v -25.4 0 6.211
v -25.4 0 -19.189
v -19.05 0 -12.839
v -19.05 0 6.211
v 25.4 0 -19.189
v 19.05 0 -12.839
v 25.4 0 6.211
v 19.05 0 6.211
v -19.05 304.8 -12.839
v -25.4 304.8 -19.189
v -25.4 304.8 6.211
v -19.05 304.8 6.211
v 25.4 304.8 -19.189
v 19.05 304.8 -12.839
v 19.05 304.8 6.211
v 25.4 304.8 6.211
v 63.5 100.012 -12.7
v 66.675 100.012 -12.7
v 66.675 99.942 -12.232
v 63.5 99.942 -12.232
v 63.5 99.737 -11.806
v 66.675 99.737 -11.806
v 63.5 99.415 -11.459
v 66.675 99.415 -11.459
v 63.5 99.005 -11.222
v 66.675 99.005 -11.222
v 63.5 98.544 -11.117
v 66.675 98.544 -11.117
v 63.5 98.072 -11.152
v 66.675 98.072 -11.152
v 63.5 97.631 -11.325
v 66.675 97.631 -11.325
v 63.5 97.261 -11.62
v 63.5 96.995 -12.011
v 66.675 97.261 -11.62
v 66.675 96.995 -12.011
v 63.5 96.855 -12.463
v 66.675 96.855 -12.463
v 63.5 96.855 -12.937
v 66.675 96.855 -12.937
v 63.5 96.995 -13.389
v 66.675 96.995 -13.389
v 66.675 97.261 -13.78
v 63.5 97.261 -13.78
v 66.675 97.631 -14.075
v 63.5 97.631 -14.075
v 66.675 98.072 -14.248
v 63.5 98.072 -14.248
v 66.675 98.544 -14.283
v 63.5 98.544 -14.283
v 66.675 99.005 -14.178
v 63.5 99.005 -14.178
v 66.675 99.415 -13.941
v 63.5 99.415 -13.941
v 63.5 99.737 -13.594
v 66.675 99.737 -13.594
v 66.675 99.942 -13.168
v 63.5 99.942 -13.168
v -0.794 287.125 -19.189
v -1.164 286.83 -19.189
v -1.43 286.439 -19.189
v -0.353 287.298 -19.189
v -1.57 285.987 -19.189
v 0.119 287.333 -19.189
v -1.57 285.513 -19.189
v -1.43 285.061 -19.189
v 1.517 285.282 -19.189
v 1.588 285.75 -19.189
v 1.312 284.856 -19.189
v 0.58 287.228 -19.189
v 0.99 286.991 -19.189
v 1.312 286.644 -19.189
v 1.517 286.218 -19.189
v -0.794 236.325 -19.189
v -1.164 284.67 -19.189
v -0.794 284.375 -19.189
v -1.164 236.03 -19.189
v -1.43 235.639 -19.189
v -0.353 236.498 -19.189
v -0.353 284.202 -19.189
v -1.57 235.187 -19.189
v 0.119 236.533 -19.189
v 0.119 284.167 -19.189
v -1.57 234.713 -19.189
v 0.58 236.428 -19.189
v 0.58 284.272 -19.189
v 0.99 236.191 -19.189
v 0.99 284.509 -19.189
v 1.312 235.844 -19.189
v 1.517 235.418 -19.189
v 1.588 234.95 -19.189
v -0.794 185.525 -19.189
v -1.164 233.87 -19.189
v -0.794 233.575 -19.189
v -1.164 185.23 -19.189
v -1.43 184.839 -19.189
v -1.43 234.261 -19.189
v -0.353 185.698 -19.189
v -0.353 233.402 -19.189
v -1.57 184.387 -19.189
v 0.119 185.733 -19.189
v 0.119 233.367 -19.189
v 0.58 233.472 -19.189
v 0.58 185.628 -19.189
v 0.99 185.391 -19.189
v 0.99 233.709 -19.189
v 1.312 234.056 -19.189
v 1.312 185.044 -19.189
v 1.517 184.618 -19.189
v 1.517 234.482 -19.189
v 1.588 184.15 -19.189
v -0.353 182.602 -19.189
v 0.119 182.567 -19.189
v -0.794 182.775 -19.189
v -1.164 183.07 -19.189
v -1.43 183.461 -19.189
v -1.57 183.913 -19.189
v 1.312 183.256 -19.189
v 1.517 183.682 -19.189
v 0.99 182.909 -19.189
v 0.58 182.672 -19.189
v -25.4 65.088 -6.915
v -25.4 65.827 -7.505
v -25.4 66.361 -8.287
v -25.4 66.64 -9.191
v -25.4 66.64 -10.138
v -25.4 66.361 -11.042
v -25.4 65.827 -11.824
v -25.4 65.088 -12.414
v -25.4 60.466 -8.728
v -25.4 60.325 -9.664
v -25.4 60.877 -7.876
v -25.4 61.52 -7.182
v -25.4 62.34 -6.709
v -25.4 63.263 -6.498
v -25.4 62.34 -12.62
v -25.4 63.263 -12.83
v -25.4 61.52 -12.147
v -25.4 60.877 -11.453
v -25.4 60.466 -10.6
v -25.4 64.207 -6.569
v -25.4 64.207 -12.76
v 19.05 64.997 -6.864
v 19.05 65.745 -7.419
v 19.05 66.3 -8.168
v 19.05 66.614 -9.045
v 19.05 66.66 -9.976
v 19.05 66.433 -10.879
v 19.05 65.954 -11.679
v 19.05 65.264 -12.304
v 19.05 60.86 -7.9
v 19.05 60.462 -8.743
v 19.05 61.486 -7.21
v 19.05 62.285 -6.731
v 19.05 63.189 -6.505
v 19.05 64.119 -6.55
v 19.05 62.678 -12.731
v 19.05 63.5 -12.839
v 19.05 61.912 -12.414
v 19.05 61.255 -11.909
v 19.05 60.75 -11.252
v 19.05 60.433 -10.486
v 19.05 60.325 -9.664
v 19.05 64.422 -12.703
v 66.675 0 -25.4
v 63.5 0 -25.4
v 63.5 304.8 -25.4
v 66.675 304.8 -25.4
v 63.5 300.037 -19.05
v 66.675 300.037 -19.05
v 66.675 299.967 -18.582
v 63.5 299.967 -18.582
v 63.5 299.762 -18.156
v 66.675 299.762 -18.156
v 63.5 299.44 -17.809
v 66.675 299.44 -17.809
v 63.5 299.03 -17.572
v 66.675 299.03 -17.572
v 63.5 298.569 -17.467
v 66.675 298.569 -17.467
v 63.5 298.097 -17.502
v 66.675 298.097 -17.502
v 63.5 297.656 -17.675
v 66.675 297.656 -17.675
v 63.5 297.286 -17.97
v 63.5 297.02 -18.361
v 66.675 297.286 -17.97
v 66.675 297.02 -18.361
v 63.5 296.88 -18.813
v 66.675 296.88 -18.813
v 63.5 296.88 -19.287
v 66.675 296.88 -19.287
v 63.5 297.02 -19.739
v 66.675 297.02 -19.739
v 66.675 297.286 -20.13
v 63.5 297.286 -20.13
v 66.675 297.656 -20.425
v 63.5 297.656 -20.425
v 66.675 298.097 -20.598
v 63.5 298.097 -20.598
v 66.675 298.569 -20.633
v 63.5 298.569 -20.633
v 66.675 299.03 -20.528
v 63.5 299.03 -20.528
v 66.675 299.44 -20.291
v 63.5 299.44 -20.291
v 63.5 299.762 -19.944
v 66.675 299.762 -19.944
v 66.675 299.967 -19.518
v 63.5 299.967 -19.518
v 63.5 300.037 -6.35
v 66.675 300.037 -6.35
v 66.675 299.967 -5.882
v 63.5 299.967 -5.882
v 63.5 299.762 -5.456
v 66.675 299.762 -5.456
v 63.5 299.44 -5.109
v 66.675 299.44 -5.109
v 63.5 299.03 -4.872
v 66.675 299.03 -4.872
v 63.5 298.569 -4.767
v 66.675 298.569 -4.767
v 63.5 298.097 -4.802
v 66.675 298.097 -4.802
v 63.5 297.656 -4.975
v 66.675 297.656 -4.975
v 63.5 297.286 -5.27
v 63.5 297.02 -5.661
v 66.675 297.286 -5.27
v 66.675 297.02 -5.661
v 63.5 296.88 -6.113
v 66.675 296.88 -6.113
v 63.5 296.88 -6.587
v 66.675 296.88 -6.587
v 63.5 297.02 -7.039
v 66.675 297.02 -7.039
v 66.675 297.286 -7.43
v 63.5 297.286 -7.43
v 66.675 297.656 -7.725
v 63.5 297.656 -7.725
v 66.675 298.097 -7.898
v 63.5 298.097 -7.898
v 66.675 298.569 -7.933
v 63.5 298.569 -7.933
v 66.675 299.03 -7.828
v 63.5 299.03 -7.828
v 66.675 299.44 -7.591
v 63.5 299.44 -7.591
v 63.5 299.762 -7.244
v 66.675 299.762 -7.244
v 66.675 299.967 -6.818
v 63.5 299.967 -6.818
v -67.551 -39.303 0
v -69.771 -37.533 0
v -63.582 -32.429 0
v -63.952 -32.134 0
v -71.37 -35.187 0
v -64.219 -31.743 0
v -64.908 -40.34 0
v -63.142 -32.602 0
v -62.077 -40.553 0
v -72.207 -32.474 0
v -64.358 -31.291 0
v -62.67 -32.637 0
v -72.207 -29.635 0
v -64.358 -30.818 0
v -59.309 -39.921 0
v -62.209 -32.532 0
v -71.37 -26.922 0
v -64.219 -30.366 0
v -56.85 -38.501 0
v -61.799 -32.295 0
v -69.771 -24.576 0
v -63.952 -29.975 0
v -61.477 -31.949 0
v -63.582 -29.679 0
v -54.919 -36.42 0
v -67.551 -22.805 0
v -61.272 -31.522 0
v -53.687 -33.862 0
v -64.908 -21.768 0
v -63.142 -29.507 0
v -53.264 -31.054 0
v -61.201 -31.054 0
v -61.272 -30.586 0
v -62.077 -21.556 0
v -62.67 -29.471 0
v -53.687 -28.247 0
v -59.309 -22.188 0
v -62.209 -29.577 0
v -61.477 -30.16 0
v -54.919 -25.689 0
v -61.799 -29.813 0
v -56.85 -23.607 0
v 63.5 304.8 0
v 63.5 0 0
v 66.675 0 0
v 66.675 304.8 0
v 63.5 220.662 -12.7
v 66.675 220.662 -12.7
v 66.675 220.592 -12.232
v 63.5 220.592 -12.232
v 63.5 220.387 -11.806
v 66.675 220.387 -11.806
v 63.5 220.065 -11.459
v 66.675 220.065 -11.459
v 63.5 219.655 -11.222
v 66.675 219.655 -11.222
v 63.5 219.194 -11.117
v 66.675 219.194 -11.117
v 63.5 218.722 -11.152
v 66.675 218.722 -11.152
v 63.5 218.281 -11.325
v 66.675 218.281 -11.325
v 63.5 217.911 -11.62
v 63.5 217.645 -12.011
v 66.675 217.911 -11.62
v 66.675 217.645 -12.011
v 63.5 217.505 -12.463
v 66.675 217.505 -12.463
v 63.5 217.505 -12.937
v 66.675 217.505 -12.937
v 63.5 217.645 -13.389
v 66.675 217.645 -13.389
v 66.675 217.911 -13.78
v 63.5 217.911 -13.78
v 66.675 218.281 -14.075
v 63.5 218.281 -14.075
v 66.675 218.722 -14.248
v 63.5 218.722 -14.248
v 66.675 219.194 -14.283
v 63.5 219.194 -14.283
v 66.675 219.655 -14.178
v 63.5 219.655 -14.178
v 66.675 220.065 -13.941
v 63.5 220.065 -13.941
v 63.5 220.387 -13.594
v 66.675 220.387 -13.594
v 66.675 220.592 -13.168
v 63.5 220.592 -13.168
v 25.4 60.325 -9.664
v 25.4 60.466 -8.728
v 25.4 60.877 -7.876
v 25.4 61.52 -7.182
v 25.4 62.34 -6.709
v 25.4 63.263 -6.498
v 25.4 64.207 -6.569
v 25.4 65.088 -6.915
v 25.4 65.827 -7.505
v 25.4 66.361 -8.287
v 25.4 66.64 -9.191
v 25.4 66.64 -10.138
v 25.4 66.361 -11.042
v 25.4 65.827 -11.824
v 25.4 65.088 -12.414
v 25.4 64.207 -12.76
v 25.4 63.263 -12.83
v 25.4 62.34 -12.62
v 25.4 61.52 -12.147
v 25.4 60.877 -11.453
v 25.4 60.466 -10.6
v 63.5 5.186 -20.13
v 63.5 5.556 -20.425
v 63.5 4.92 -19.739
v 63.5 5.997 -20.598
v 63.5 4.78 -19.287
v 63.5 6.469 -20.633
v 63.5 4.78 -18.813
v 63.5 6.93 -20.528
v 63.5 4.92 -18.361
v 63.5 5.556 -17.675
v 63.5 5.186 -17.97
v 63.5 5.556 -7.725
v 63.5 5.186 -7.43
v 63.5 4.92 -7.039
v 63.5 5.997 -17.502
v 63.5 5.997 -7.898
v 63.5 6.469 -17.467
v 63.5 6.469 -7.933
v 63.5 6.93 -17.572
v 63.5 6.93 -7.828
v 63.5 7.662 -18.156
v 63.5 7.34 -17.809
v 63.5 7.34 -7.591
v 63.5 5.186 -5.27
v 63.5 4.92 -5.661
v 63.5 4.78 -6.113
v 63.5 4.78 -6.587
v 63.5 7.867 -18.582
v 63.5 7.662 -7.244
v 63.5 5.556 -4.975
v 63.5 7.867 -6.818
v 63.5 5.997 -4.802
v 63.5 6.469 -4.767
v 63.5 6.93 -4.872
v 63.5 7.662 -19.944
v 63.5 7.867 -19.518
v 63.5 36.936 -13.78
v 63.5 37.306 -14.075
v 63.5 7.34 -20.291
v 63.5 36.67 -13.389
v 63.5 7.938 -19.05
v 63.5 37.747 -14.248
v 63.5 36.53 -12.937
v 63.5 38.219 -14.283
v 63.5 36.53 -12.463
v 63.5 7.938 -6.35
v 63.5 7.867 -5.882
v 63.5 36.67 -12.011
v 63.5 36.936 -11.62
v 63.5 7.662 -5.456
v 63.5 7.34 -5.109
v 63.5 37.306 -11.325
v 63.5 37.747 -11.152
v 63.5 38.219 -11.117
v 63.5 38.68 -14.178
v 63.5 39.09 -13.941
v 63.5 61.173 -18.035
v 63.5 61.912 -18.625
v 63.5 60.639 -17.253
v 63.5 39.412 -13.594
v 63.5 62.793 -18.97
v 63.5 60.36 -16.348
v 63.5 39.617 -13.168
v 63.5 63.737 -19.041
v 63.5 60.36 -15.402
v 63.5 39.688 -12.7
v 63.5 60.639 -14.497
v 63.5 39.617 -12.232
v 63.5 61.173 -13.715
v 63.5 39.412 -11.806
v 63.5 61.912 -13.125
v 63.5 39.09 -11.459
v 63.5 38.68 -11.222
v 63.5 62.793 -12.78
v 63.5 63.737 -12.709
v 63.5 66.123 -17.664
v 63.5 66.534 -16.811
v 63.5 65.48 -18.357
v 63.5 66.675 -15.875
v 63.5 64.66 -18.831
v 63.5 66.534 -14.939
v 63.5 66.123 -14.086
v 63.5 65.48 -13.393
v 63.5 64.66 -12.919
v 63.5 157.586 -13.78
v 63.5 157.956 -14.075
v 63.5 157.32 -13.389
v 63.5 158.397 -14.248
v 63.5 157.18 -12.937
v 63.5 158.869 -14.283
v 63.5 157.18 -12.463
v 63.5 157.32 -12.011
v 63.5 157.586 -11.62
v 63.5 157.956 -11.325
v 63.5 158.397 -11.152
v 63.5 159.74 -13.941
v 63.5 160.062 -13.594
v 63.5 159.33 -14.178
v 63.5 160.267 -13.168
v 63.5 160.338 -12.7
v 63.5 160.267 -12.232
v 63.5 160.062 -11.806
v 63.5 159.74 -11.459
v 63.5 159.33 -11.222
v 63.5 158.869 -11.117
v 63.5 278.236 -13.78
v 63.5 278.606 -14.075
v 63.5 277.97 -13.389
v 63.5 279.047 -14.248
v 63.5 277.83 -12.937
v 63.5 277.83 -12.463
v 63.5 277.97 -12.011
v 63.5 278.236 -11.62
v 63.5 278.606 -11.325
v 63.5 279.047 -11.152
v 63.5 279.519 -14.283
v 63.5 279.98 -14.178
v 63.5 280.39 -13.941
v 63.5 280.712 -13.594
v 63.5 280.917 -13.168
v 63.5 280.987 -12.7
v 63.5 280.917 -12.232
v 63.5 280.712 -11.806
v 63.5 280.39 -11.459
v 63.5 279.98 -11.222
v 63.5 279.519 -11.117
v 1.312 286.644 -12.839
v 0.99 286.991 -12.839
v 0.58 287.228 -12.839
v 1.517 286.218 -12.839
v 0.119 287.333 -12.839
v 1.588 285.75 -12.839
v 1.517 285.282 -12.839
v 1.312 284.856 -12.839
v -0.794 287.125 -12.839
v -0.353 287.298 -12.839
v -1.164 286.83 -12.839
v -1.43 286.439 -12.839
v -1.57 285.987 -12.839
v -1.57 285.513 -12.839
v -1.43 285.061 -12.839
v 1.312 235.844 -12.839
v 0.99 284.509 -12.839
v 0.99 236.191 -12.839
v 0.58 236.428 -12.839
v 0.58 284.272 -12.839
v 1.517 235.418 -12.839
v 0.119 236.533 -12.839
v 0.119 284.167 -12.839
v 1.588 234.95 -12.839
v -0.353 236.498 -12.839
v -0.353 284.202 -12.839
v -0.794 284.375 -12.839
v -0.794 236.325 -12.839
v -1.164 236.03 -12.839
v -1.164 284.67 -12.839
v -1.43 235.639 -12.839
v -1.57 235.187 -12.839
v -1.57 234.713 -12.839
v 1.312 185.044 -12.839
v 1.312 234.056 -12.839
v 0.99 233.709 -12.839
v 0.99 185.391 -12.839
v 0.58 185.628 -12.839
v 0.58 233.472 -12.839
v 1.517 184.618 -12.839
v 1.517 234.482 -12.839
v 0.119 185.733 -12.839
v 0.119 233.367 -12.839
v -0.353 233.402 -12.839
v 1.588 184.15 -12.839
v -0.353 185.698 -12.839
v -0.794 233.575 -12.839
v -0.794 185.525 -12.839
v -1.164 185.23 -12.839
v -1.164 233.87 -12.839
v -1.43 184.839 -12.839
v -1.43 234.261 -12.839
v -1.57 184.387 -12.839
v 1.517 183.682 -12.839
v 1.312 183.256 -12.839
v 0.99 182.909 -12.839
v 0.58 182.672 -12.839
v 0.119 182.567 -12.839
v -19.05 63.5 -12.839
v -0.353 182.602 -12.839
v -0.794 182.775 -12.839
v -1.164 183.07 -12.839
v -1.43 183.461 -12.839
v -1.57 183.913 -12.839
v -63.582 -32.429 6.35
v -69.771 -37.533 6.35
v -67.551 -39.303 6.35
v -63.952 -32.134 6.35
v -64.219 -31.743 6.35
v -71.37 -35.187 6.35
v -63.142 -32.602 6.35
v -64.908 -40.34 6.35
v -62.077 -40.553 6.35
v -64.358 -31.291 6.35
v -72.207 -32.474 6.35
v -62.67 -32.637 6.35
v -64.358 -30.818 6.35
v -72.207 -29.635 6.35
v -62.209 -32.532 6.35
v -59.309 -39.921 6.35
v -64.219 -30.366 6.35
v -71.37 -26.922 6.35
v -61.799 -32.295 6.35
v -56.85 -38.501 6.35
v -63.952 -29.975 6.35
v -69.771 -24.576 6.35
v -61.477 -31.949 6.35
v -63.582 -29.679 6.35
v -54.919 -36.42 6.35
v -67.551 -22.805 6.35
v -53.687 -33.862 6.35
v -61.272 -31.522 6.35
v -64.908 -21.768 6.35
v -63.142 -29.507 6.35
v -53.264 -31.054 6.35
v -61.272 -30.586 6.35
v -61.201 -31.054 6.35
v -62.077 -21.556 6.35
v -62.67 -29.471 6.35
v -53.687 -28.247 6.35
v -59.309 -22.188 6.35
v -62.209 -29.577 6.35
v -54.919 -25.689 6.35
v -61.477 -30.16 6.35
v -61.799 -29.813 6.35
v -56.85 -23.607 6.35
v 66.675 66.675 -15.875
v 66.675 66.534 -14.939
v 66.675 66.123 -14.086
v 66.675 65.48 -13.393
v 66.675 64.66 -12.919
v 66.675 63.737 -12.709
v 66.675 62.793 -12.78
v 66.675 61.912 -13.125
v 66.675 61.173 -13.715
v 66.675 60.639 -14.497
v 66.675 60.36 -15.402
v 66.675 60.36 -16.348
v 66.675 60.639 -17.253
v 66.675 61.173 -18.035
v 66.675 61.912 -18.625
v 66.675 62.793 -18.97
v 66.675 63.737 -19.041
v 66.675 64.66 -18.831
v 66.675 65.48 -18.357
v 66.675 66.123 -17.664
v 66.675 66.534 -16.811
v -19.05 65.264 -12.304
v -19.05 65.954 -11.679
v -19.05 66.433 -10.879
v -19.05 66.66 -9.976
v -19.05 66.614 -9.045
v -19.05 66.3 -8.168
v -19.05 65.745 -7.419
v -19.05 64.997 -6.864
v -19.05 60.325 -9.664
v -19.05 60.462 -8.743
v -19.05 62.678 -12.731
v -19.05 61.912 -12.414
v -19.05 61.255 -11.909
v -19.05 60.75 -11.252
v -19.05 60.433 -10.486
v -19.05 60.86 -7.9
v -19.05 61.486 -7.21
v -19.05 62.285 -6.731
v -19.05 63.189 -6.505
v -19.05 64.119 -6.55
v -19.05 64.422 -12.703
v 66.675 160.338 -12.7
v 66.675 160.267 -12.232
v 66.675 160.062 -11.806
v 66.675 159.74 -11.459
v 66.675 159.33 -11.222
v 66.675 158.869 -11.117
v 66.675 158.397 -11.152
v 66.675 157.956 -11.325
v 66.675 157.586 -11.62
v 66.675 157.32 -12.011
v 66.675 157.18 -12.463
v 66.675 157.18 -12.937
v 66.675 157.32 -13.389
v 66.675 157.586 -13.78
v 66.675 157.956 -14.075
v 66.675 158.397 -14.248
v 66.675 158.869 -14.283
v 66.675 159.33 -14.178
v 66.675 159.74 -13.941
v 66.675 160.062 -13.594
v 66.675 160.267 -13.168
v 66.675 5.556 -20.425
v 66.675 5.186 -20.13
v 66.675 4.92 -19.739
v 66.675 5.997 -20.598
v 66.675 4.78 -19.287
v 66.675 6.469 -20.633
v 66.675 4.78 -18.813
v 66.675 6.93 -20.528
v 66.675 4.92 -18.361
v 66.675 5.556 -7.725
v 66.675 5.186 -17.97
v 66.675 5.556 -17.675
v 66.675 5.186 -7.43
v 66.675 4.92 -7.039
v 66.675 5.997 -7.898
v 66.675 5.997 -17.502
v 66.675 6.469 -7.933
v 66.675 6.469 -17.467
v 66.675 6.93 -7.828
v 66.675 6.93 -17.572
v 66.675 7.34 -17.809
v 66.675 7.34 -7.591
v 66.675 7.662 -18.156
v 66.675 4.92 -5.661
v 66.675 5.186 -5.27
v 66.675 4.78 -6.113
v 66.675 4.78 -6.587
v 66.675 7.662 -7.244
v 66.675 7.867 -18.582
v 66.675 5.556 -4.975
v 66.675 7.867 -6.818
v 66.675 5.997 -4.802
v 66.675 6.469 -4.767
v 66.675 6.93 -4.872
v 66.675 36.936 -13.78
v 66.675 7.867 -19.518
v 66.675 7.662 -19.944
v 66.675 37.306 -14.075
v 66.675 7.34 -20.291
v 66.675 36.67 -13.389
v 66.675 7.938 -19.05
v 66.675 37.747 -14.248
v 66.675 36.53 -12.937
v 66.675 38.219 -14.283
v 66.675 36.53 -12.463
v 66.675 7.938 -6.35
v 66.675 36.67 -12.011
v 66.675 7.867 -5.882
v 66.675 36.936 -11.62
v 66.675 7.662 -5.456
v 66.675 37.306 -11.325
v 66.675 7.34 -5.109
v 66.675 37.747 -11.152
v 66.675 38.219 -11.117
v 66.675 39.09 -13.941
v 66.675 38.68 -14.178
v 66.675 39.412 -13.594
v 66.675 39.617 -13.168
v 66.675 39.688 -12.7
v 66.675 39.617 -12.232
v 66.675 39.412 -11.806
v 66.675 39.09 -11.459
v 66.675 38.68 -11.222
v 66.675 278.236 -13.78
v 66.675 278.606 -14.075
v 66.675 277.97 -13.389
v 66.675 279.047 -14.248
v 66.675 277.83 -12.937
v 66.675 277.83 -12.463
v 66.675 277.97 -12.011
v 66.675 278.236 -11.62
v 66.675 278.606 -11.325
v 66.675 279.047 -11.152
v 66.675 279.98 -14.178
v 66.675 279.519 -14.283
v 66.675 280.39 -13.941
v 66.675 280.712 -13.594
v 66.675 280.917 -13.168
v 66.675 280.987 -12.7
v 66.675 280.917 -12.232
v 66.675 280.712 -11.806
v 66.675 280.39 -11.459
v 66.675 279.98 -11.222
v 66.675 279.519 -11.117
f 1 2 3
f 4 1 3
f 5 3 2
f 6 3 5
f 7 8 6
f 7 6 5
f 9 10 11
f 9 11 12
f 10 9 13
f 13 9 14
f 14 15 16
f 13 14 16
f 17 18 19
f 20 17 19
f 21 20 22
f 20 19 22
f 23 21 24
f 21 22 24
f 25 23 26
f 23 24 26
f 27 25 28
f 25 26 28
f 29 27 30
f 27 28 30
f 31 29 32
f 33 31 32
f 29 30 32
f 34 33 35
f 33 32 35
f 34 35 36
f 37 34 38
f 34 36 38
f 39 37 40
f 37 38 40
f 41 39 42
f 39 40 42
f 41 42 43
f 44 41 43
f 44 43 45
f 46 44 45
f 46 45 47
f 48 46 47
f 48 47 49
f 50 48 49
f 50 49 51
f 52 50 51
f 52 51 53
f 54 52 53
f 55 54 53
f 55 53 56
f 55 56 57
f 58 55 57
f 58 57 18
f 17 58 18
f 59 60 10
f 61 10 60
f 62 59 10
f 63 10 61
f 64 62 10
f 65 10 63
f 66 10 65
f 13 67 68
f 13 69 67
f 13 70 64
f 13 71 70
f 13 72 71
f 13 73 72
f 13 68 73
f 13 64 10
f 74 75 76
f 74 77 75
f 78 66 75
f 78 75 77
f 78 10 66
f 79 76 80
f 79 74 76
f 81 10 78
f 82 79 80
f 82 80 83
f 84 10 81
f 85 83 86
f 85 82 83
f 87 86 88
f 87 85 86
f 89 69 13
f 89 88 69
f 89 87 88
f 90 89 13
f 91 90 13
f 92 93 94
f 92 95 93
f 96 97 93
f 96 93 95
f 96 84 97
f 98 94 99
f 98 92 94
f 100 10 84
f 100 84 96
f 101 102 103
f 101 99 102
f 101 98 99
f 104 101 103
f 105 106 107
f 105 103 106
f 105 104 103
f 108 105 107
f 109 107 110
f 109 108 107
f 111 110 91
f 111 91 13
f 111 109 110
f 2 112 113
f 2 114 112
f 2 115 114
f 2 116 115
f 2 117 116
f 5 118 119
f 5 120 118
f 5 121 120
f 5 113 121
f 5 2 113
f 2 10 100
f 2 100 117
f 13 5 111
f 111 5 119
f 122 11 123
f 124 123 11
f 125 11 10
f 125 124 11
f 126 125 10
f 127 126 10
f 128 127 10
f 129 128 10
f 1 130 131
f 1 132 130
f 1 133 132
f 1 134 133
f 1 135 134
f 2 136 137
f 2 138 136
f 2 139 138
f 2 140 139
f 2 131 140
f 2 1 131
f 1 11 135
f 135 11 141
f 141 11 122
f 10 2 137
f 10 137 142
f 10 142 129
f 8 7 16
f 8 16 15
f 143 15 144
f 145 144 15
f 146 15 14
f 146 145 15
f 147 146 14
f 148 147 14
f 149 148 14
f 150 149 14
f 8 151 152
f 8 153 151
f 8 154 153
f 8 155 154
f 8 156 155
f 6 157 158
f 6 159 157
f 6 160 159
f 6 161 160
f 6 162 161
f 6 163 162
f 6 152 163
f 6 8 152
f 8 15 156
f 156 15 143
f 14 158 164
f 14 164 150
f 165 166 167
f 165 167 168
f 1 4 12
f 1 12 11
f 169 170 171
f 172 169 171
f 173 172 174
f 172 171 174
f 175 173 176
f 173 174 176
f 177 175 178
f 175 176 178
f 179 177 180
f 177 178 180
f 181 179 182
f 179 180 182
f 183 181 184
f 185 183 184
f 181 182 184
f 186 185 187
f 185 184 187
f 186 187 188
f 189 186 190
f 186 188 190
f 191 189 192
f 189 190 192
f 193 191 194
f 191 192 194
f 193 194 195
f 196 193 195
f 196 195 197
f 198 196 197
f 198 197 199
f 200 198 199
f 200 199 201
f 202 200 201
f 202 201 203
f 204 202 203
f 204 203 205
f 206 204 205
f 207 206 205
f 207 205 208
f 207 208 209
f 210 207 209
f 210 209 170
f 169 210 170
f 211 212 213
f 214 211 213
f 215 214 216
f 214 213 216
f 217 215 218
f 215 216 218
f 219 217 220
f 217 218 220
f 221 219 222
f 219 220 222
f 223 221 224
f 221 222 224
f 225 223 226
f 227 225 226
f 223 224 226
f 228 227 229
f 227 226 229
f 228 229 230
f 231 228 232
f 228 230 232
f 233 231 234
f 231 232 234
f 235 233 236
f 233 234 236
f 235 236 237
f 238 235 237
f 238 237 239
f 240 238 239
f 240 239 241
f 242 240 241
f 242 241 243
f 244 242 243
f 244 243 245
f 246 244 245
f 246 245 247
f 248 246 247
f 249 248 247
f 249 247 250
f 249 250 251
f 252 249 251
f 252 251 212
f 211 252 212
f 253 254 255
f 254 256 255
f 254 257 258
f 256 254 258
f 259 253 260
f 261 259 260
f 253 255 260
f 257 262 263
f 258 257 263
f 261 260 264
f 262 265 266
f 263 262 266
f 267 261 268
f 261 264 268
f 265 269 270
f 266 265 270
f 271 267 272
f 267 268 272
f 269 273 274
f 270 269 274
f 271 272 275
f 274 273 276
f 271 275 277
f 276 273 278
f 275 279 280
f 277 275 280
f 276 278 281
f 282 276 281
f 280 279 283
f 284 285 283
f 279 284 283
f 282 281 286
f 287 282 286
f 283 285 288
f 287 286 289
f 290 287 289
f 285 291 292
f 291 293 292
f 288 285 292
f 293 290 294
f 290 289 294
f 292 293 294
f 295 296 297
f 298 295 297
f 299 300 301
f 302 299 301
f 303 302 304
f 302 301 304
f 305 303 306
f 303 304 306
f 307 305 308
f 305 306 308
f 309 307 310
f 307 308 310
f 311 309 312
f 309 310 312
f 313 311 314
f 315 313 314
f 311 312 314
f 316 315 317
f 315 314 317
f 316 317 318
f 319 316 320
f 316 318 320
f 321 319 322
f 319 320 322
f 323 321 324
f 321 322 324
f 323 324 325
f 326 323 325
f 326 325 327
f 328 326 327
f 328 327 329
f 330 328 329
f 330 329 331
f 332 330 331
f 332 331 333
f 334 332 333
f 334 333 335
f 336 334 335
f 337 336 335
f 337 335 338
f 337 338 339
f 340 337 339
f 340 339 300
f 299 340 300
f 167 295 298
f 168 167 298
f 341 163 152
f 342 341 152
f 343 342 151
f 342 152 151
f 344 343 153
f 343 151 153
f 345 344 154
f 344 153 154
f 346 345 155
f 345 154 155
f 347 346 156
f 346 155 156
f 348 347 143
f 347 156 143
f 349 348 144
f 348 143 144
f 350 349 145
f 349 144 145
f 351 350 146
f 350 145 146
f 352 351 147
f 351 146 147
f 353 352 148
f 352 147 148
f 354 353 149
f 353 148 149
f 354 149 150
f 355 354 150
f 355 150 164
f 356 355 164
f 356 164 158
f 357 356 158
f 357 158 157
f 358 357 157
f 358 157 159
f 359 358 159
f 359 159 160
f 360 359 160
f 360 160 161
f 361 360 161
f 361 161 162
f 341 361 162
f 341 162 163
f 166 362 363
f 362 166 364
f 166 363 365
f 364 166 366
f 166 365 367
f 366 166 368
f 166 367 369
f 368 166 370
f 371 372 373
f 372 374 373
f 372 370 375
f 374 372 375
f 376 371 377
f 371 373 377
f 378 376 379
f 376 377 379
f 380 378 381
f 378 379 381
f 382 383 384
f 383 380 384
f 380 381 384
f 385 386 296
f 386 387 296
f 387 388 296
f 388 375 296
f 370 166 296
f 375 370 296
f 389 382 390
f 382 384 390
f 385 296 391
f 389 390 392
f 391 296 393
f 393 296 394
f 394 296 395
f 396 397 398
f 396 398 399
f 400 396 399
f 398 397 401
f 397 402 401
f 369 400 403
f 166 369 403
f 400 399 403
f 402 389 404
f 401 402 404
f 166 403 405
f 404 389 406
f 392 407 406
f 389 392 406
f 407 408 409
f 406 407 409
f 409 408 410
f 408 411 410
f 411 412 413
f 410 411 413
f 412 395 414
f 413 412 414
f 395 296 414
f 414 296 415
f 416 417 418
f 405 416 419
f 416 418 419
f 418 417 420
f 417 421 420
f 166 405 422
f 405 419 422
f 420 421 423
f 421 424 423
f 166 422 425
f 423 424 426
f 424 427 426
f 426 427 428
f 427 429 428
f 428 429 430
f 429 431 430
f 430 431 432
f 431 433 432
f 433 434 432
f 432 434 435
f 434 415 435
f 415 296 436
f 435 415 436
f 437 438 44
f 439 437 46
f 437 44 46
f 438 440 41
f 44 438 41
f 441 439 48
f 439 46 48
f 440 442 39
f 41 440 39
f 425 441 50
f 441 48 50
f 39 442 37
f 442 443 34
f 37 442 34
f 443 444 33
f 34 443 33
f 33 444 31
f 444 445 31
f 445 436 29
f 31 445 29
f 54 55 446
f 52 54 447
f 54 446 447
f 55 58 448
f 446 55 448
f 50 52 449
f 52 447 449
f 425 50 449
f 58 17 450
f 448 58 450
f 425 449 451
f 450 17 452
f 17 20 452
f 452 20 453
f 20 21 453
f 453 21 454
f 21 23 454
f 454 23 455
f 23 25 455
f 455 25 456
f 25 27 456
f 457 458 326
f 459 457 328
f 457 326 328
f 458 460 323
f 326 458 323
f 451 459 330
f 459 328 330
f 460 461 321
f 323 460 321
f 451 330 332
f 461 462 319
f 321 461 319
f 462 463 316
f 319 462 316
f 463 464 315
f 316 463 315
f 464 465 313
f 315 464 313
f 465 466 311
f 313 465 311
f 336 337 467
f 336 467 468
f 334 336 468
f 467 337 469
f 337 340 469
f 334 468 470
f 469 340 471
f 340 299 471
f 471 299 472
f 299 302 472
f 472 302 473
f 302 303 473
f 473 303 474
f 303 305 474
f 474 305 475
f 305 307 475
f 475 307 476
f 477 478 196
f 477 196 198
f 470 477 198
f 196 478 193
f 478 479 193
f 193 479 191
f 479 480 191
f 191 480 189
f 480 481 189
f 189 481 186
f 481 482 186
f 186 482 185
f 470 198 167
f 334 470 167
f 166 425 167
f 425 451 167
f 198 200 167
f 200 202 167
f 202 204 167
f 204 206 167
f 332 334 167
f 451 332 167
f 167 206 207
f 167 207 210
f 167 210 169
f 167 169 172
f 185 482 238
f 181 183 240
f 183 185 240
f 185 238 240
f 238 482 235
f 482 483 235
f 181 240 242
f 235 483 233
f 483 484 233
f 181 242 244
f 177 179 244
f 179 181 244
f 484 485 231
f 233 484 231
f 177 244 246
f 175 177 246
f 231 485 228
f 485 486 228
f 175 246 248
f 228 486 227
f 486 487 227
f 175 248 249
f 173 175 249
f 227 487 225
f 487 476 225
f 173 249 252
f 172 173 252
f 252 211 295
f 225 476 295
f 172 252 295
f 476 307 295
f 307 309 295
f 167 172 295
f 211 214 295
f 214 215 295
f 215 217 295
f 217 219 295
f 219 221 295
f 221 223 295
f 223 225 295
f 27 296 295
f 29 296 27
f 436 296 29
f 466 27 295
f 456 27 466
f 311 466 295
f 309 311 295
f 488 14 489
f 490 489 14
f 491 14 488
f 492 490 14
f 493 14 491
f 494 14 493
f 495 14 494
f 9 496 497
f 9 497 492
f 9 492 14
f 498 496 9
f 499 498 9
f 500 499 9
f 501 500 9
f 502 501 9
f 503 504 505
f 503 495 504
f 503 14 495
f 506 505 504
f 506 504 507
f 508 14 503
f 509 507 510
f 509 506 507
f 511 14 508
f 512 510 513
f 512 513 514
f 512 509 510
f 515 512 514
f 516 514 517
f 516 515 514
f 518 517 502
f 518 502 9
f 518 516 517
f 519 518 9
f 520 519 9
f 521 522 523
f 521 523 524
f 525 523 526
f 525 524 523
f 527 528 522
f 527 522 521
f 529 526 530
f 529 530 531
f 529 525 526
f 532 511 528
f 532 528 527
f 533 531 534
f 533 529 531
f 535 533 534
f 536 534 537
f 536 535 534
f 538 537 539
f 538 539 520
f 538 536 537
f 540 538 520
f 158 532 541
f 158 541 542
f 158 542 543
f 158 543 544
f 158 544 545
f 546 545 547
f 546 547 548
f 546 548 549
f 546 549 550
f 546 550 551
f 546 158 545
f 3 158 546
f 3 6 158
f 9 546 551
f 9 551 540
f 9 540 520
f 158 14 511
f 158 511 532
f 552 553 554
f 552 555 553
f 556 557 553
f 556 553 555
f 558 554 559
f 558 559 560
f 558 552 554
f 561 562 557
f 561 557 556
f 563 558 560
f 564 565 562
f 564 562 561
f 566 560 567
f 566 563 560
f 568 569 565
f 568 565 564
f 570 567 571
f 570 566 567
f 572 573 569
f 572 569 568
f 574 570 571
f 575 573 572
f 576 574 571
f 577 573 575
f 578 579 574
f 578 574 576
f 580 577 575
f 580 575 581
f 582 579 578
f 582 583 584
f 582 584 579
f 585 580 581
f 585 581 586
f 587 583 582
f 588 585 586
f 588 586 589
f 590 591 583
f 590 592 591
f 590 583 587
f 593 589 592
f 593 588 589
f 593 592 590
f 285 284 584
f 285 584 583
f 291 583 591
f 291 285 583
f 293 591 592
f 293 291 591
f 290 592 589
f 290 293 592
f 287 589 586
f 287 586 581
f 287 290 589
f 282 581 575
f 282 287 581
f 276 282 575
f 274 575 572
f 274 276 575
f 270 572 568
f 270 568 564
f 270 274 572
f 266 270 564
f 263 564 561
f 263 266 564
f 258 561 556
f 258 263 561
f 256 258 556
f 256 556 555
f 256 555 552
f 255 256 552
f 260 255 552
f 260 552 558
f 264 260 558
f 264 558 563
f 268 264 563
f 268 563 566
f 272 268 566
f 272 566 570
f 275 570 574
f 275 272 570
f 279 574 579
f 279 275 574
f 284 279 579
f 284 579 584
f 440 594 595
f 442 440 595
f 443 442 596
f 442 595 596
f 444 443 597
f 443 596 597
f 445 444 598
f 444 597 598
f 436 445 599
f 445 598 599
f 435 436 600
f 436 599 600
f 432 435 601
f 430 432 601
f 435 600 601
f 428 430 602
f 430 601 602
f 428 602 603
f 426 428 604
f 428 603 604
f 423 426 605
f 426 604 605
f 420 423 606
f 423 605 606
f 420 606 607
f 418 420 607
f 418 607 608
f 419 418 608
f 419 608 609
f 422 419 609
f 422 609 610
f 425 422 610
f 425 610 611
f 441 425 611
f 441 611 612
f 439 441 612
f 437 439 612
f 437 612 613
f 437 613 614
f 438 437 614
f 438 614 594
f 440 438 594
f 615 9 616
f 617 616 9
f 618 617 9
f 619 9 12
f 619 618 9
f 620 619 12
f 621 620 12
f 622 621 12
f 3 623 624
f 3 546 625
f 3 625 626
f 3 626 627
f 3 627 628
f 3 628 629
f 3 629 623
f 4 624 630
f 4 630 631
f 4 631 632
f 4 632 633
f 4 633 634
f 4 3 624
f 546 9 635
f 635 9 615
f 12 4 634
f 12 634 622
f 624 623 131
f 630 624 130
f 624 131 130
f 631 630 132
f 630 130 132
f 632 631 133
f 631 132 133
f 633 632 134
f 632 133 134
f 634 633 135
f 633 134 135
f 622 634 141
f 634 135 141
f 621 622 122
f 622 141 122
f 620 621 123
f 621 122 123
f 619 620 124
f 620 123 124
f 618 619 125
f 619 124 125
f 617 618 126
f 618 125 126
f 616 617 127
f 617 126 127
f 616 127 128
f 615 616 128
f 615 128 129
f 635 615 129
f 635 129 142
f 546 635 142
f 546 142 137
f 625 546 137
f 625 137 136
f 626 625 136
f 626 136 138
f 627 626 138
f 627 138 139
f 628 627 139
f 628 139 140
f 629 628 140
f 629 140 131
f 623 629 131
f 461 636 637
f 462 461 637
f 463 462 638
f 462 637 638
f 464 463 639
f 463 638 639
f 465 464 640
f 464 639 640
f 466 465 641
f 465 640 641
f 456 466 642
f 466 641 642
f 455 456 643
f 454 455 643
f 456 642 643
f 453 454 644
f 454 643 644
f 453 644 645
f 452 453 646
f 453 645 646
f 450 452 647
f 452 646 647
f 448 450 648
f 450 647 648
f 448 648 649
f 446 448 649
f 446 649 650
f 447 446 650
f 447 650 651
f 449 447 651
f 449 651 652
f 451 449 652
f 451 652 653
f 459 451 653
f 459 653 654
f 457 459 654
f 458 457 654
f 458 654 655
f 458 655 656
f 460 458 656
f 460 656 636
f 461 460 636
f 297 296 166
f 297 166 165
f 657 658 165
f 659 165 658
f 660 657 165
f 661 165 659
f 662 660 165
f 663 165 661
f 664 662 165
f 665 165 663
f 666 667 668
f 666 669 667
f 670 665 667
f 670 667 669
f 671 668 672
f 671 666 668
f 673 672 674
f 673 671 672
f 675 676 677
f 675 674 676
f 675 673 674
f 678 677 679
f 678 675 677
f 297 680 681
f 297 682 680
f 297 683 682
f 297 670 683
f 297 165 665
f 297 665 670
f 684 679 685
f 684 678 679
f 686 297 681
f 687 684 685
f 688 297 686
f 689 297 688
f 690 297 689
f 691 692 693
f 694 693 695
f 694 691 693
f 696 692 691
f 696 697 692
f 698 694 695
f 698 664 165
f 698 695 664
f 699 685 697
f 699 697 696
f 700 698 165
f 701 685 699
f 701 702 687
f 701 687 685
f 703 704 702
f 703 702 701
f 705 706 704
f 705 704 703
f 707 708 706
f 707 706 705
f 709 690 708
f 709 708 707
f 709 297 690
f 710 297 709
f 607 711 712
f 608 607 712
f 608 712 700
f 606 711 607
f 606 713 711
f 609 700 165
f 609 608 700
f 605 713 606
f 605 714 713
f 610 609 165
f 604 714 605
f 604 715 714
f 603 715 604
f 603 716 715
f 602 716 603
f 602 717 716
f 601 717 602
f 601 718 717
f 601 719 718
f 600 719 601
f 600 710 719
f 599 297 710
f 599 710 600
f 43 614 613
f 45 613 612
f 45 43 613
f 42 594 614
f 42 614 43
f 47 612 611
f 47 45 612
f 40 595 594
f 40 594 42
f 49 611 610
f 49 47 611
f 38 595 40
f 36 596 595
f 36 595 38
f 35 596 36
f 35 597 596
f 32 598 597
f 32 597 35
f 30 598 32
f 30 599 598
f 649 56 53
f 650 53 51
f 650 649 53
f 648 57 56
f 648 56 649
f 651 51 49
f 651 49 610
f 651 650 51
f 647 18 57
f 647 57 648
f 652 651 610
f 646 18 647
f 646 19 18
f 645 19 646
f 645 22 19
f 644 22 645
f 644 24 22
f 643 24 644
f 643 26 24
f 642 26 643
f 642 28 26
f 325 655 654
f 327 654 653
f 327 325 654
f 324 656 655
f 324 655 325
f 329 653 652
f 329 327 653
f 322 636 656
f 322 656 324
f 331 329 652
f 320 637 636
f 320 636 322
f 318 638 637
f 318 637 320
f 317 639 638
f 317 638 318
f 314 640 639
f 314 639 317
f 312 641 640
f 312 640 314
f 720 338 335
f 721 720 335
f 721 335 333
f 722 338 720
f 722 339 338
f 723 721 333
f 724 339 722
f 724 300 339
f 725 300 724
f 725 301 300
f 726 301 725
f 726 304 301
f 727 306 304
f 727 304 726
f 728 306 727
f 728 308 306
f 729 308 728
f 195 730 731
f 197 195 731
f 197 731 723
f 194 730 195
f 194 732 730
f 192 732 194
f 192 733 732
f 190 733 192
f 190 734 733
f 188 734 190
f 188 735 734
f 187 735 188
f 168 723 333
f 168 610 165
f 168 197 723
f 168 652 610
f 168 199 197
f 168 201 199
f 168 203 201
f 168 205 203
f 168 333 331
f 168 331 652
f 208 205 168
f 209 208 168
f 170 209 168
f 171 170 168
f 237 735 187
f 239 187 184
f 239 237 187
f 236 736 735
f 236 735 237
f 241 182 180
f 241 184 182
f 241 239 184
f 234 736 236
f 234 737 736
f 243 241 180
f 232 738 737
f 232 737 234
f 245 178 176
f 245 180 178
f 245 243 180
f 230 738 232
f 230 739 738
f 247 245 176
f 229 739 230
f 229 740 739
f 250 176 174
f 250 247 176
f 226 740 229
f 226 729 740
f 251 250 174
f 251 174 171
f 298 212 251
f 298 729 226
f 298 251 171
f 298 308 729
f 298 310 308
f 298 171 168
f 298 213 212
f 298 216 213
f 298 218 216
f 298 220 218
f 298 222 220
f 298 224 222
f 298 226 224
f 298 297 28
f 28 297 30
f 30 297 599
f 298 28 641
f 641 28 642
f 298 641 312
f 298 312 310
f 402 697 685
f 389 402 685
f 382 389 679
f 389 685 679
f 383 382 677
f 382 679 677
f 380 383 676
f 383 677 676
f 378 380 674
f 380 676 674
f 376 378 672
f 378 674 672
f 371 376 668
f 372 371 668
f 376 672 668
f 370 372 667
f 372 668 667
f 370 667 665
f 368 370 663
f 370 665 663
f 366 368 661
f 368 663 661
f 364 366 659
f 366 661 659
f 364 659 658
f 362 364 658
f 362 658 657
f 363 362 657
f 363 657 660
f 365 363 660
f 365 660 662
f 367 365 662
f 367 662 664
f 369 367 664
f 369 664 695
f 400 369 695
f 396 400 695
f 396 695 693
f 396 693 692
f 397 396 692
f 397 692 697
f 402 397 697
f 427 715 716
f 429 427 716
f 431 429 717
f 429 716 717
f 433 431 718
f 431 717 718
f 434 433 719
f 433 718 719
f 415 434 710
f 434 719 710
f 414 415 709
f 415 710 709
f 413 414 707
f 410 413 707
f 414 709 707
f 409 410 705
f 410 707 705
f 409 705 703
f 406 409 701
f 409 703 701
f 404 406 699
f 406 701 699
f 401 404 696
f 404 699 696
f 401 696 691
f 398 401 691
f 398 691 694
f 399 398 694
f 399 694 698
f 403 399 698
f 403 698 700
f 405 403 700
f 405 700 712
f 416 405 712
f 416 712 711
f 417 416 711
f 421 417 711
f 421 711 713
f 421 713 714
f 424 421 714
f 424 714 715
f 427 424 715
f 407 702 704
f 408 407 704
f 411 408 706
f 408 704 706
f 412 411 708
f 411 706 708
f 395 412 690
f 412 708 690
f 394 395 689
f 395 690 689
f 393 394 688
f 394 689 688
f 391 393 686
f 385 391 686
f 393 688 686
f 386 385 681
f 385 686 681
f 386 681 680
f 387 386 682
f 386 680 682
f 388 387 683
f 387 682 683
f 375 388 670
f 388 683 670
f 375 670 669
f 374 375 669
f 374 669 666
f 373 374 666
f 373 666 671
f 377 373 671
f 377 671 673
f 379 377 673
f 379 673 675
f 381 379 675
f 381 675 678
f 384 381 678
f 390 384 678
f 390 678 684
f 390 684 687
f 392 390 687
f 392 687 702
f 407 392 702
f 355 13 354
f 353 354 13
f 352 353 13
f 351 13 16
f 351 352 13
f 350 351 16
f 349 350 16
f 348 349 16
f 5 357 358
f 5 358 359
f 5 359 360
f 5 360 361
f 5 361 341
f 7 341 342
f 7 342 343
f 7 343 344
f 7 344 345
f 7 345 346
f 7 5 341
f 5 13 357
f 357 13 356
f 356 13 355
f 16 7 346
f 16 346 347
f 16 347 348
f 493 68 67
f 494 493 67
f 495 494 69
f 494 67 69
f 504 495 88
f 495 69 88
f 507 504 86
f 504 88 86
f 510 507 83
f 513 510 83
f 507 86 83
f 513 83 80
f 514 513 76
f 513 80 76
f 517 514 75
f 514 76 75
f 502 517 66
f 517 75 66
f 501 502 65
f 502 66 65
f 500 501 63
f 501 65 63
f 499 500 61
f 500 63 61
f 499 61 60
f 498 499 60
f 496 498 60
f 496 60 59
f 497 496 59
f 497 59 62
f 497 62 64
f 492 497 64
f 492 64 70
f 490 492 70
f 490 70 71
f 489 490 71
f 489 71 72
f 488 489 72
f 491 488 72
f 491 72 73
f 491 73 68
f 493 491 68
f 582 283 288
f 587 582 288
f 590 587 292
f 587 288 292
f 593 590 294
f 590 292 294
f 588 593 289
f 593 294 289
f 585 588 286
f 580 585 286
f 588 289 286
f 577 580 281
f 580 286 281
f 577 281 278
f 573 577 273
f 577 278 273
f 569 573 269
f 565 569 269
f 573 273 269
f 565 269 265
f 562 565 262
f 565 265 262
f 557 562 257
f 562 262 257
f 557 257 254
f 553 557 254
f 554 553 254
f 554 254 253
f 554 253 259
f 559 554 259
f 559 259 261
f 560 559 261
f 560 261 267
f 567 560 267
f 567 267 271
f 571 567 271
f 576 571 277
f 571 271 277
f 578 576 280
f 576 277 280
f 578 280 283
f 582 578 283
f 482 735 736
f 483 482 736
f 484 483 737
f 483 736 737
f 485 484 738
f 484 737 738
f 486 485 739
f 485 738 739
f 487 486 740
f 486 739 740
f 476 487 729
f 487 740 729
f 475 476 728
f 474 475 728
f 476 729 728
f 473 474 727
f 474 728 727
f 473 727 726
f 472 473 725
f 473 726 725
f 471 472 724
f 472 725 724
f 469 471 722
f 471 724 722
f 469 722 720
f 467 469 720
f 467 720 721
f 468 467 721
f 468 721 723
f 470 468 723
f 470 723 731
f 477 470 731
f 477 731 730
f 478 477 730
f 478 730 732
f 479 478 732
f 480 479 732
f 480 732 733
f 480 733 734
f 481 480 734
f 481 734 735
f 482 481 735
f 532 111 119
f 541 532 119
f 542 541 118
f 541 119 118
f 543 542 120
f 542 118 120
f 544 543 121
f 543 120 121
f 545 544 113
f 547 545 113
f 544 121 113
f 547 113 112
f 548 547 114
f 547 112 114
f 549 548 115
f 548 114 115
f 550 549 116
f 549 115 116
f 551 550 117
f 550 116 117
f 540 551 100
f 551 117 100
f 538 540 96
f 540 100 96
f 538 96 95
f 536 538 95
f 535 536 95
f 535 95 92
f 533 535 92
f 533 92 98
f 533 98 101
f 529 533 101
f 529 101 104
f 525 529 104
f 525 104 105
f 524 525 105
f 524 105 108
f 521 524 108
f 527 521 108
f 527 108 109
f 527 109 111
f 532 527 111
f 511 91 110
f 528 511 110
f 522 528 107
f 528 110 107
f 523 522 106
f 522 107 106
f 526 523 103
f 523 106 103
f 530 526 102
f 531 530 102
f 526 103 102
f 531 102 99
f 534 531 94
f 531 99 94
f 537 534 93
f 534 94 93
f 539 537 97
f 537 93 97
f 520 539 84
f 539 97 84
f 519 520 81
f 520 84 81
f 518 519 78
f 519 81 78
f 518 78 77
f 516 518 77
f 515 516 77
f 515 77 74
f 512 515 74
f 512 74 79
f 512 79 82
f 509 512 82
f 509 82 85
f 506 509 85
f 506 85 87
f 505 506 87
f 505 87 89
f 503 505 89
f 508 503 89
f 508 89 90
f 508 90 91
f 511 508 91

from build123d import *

# Parameters (mm, degrees)
F1_DEPTH  = 304.8
F2_R      = 3.175
F3_DEPTH  = 50.8
F4_W      = 3.175
F4_H      = 304.8
F5_DEPTH  = 25.4
F6_R      = 3.175
F7_DEPTH  = 25.4
F8_R      = 1.5875
F9_DEPTH  = 25.4
F10_R     = 9.525
F10_R_2   = 1.5875
F11_DEPTH = 6.35
F12_R     = 1.5875
F13_DEPTH = 25.4


with BuildPart() as f1:
    # F0 (on Front) → F1 (new body)
    with BuildSketch(Plane.XZ):
        Polygon((-19.05, 6.210679), (-25.4, 6.210679), (-25.4, -19.189321), (25.4, -19.189321), (25.4, 6.210679), (19.05, 6.210679), (19.05, -12.839321), (-19.05, -12.839321), align=None)
    extrude(amount=-F1_DEPTH)

    # F2 (on face) → F3 (cut, through all)
    with BuildSketch(Plane(origin=(-25.4, 0, 0), x_dir=(0, -1, 0), z_dir=(-1, 0, 0))):
        with Locations((-63.5, -9.664321)):
            Circle(F2_R)
    extrude(amount=-F3_DEPTH, mode=Mode.SUBTRACT)

    # F12 (on face) → F13 (cut)
    with BuildSketch(Plane(origin=(0, 0, -19.189321), x_dir=(1, 0, 0), z_dir=(0, 0, -1))):
        with Locations((0, -184.15)):
            Circle(F12_R)
        with Locations((0, -234.95)):
            Circle(F12_R)
        with Locations((0, -285.75)):
            Circle(F12_R)
    extrude(amount=-F13_DEPTH, mode=Mode.SUBTRACT)


with BuildPart() as f5:
    # F4 (on Top) → F5 (new body)
    with BuildSketch(Plane.XY):
        with Locations((65.087453, 152.4)):
            Rectangle(F4_W, F4_H)
    extrude(amount=-F5_DEPTH)

    # F6 (on face) → F7 (cut)
    with BuildSketch(Plane.YZ.offset(66.674953)):
        with Locations((63.5, -15.875)):
            Circle(F6_R)
    extrude(amount=-F7_DEPTH, mode=Mode.SUBTRACT)

    # F8 (on face) → F9 (cut)
    with BuildSketch(Plane.YZ.offset(66.674953)):
        with Locations((6.35, -6.35)):
            Circle(F8_R)
        with Locations((6.35, -19.05)):
            Circle(F8_R)
        with Locations((38.1, -12.7)):
            Circle(F8_R)
        with Locations((98.425, -12.7)):
            Circle(F8_R)
        with Locations((158.75, -12.7)):
            Circle(F8_R)
        with Locations((219.075, -12.7)):
            Circle(F8_R)
        with Locations((279.4, -12.7)):
            Circle(F8_R)
        with Locations((298.45, -6.35)):
            Circle(F8_R)
        with Locations((298.45, -19.05)):
            Circle(F8_R)
    extrude(amount=-F9_DEPTH, mode=Mode.SUBTRACT)


with BuildPart() as f11:
    # F10 (on Top) → F11 (new body)
    with BuildSketch(Plane.XY):
        with Locations((-62.788613, -31.054294)):
            Circle(F10_R)
        with Locations((-62.788613, -31.054294)):
            Circle(F10_R_2, mode=Mode.SUBTRACT)
    extrude(amount=F11_DEPTH)


solid = Compound([f1.part, f5.part, f11.part])
